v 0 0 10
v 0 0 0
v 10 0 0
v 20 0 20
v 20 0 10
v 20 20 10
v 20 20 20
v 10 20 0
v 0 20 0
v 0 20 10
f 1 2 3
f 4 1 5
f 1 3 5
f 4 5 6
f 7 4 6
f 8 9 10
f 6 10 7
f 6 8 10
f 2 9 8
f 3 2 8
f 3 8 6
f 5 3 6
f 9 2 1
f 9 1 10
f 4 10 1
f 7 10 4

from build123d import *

# Parameters (mm, degrees)
SKETCH1_W           = 20
SKETCH1_H           = 20
BOSS_EXTRUDE1_DEPTH = 20
CUT_EXTRUDE1_DEPTH  = 20
CUT_EXTRUDE2_DEPTH  = 20


with BuildPart() as part:
    # Sketch1 → Boss-Extrude1 (new body)
    with BuildSketch(Plane.XY):
        with Locations((10, 10)):
            Rectangle(SKETCH1_W, SKETCH1_H)
    extrude(amount=BOSS_EXTRUDE1_DEPTH)

    # Sketch2 → Cut-Extrude1 (cut)
    with BuildSketch(Plane(origin=(0, 20, 0), x_dir=(1, 0, 0), z_dir=(0, 1, 0))):
        Polygon((20, 0), (10, 0), (20, -10), align=None)
    extrude(amount=-CUT_EXTRUDE1_DEPTH, mode=Mode.SUBTRACT)

    # Sketch3 → Cut-Extrude2 (cut)
    with BuildSketch(Plane(origin=(0, 20, 0), x_dir=(1, 0, 0), z_dir=(0, 1, 0))):
        Polygon((20, -20), (0, -20), (0, -10), align=None)
    extrude(amount=-CUT_EXTRUDE2_DEPTH, mode=Mode.SUBTRACT)


solid = part.part
